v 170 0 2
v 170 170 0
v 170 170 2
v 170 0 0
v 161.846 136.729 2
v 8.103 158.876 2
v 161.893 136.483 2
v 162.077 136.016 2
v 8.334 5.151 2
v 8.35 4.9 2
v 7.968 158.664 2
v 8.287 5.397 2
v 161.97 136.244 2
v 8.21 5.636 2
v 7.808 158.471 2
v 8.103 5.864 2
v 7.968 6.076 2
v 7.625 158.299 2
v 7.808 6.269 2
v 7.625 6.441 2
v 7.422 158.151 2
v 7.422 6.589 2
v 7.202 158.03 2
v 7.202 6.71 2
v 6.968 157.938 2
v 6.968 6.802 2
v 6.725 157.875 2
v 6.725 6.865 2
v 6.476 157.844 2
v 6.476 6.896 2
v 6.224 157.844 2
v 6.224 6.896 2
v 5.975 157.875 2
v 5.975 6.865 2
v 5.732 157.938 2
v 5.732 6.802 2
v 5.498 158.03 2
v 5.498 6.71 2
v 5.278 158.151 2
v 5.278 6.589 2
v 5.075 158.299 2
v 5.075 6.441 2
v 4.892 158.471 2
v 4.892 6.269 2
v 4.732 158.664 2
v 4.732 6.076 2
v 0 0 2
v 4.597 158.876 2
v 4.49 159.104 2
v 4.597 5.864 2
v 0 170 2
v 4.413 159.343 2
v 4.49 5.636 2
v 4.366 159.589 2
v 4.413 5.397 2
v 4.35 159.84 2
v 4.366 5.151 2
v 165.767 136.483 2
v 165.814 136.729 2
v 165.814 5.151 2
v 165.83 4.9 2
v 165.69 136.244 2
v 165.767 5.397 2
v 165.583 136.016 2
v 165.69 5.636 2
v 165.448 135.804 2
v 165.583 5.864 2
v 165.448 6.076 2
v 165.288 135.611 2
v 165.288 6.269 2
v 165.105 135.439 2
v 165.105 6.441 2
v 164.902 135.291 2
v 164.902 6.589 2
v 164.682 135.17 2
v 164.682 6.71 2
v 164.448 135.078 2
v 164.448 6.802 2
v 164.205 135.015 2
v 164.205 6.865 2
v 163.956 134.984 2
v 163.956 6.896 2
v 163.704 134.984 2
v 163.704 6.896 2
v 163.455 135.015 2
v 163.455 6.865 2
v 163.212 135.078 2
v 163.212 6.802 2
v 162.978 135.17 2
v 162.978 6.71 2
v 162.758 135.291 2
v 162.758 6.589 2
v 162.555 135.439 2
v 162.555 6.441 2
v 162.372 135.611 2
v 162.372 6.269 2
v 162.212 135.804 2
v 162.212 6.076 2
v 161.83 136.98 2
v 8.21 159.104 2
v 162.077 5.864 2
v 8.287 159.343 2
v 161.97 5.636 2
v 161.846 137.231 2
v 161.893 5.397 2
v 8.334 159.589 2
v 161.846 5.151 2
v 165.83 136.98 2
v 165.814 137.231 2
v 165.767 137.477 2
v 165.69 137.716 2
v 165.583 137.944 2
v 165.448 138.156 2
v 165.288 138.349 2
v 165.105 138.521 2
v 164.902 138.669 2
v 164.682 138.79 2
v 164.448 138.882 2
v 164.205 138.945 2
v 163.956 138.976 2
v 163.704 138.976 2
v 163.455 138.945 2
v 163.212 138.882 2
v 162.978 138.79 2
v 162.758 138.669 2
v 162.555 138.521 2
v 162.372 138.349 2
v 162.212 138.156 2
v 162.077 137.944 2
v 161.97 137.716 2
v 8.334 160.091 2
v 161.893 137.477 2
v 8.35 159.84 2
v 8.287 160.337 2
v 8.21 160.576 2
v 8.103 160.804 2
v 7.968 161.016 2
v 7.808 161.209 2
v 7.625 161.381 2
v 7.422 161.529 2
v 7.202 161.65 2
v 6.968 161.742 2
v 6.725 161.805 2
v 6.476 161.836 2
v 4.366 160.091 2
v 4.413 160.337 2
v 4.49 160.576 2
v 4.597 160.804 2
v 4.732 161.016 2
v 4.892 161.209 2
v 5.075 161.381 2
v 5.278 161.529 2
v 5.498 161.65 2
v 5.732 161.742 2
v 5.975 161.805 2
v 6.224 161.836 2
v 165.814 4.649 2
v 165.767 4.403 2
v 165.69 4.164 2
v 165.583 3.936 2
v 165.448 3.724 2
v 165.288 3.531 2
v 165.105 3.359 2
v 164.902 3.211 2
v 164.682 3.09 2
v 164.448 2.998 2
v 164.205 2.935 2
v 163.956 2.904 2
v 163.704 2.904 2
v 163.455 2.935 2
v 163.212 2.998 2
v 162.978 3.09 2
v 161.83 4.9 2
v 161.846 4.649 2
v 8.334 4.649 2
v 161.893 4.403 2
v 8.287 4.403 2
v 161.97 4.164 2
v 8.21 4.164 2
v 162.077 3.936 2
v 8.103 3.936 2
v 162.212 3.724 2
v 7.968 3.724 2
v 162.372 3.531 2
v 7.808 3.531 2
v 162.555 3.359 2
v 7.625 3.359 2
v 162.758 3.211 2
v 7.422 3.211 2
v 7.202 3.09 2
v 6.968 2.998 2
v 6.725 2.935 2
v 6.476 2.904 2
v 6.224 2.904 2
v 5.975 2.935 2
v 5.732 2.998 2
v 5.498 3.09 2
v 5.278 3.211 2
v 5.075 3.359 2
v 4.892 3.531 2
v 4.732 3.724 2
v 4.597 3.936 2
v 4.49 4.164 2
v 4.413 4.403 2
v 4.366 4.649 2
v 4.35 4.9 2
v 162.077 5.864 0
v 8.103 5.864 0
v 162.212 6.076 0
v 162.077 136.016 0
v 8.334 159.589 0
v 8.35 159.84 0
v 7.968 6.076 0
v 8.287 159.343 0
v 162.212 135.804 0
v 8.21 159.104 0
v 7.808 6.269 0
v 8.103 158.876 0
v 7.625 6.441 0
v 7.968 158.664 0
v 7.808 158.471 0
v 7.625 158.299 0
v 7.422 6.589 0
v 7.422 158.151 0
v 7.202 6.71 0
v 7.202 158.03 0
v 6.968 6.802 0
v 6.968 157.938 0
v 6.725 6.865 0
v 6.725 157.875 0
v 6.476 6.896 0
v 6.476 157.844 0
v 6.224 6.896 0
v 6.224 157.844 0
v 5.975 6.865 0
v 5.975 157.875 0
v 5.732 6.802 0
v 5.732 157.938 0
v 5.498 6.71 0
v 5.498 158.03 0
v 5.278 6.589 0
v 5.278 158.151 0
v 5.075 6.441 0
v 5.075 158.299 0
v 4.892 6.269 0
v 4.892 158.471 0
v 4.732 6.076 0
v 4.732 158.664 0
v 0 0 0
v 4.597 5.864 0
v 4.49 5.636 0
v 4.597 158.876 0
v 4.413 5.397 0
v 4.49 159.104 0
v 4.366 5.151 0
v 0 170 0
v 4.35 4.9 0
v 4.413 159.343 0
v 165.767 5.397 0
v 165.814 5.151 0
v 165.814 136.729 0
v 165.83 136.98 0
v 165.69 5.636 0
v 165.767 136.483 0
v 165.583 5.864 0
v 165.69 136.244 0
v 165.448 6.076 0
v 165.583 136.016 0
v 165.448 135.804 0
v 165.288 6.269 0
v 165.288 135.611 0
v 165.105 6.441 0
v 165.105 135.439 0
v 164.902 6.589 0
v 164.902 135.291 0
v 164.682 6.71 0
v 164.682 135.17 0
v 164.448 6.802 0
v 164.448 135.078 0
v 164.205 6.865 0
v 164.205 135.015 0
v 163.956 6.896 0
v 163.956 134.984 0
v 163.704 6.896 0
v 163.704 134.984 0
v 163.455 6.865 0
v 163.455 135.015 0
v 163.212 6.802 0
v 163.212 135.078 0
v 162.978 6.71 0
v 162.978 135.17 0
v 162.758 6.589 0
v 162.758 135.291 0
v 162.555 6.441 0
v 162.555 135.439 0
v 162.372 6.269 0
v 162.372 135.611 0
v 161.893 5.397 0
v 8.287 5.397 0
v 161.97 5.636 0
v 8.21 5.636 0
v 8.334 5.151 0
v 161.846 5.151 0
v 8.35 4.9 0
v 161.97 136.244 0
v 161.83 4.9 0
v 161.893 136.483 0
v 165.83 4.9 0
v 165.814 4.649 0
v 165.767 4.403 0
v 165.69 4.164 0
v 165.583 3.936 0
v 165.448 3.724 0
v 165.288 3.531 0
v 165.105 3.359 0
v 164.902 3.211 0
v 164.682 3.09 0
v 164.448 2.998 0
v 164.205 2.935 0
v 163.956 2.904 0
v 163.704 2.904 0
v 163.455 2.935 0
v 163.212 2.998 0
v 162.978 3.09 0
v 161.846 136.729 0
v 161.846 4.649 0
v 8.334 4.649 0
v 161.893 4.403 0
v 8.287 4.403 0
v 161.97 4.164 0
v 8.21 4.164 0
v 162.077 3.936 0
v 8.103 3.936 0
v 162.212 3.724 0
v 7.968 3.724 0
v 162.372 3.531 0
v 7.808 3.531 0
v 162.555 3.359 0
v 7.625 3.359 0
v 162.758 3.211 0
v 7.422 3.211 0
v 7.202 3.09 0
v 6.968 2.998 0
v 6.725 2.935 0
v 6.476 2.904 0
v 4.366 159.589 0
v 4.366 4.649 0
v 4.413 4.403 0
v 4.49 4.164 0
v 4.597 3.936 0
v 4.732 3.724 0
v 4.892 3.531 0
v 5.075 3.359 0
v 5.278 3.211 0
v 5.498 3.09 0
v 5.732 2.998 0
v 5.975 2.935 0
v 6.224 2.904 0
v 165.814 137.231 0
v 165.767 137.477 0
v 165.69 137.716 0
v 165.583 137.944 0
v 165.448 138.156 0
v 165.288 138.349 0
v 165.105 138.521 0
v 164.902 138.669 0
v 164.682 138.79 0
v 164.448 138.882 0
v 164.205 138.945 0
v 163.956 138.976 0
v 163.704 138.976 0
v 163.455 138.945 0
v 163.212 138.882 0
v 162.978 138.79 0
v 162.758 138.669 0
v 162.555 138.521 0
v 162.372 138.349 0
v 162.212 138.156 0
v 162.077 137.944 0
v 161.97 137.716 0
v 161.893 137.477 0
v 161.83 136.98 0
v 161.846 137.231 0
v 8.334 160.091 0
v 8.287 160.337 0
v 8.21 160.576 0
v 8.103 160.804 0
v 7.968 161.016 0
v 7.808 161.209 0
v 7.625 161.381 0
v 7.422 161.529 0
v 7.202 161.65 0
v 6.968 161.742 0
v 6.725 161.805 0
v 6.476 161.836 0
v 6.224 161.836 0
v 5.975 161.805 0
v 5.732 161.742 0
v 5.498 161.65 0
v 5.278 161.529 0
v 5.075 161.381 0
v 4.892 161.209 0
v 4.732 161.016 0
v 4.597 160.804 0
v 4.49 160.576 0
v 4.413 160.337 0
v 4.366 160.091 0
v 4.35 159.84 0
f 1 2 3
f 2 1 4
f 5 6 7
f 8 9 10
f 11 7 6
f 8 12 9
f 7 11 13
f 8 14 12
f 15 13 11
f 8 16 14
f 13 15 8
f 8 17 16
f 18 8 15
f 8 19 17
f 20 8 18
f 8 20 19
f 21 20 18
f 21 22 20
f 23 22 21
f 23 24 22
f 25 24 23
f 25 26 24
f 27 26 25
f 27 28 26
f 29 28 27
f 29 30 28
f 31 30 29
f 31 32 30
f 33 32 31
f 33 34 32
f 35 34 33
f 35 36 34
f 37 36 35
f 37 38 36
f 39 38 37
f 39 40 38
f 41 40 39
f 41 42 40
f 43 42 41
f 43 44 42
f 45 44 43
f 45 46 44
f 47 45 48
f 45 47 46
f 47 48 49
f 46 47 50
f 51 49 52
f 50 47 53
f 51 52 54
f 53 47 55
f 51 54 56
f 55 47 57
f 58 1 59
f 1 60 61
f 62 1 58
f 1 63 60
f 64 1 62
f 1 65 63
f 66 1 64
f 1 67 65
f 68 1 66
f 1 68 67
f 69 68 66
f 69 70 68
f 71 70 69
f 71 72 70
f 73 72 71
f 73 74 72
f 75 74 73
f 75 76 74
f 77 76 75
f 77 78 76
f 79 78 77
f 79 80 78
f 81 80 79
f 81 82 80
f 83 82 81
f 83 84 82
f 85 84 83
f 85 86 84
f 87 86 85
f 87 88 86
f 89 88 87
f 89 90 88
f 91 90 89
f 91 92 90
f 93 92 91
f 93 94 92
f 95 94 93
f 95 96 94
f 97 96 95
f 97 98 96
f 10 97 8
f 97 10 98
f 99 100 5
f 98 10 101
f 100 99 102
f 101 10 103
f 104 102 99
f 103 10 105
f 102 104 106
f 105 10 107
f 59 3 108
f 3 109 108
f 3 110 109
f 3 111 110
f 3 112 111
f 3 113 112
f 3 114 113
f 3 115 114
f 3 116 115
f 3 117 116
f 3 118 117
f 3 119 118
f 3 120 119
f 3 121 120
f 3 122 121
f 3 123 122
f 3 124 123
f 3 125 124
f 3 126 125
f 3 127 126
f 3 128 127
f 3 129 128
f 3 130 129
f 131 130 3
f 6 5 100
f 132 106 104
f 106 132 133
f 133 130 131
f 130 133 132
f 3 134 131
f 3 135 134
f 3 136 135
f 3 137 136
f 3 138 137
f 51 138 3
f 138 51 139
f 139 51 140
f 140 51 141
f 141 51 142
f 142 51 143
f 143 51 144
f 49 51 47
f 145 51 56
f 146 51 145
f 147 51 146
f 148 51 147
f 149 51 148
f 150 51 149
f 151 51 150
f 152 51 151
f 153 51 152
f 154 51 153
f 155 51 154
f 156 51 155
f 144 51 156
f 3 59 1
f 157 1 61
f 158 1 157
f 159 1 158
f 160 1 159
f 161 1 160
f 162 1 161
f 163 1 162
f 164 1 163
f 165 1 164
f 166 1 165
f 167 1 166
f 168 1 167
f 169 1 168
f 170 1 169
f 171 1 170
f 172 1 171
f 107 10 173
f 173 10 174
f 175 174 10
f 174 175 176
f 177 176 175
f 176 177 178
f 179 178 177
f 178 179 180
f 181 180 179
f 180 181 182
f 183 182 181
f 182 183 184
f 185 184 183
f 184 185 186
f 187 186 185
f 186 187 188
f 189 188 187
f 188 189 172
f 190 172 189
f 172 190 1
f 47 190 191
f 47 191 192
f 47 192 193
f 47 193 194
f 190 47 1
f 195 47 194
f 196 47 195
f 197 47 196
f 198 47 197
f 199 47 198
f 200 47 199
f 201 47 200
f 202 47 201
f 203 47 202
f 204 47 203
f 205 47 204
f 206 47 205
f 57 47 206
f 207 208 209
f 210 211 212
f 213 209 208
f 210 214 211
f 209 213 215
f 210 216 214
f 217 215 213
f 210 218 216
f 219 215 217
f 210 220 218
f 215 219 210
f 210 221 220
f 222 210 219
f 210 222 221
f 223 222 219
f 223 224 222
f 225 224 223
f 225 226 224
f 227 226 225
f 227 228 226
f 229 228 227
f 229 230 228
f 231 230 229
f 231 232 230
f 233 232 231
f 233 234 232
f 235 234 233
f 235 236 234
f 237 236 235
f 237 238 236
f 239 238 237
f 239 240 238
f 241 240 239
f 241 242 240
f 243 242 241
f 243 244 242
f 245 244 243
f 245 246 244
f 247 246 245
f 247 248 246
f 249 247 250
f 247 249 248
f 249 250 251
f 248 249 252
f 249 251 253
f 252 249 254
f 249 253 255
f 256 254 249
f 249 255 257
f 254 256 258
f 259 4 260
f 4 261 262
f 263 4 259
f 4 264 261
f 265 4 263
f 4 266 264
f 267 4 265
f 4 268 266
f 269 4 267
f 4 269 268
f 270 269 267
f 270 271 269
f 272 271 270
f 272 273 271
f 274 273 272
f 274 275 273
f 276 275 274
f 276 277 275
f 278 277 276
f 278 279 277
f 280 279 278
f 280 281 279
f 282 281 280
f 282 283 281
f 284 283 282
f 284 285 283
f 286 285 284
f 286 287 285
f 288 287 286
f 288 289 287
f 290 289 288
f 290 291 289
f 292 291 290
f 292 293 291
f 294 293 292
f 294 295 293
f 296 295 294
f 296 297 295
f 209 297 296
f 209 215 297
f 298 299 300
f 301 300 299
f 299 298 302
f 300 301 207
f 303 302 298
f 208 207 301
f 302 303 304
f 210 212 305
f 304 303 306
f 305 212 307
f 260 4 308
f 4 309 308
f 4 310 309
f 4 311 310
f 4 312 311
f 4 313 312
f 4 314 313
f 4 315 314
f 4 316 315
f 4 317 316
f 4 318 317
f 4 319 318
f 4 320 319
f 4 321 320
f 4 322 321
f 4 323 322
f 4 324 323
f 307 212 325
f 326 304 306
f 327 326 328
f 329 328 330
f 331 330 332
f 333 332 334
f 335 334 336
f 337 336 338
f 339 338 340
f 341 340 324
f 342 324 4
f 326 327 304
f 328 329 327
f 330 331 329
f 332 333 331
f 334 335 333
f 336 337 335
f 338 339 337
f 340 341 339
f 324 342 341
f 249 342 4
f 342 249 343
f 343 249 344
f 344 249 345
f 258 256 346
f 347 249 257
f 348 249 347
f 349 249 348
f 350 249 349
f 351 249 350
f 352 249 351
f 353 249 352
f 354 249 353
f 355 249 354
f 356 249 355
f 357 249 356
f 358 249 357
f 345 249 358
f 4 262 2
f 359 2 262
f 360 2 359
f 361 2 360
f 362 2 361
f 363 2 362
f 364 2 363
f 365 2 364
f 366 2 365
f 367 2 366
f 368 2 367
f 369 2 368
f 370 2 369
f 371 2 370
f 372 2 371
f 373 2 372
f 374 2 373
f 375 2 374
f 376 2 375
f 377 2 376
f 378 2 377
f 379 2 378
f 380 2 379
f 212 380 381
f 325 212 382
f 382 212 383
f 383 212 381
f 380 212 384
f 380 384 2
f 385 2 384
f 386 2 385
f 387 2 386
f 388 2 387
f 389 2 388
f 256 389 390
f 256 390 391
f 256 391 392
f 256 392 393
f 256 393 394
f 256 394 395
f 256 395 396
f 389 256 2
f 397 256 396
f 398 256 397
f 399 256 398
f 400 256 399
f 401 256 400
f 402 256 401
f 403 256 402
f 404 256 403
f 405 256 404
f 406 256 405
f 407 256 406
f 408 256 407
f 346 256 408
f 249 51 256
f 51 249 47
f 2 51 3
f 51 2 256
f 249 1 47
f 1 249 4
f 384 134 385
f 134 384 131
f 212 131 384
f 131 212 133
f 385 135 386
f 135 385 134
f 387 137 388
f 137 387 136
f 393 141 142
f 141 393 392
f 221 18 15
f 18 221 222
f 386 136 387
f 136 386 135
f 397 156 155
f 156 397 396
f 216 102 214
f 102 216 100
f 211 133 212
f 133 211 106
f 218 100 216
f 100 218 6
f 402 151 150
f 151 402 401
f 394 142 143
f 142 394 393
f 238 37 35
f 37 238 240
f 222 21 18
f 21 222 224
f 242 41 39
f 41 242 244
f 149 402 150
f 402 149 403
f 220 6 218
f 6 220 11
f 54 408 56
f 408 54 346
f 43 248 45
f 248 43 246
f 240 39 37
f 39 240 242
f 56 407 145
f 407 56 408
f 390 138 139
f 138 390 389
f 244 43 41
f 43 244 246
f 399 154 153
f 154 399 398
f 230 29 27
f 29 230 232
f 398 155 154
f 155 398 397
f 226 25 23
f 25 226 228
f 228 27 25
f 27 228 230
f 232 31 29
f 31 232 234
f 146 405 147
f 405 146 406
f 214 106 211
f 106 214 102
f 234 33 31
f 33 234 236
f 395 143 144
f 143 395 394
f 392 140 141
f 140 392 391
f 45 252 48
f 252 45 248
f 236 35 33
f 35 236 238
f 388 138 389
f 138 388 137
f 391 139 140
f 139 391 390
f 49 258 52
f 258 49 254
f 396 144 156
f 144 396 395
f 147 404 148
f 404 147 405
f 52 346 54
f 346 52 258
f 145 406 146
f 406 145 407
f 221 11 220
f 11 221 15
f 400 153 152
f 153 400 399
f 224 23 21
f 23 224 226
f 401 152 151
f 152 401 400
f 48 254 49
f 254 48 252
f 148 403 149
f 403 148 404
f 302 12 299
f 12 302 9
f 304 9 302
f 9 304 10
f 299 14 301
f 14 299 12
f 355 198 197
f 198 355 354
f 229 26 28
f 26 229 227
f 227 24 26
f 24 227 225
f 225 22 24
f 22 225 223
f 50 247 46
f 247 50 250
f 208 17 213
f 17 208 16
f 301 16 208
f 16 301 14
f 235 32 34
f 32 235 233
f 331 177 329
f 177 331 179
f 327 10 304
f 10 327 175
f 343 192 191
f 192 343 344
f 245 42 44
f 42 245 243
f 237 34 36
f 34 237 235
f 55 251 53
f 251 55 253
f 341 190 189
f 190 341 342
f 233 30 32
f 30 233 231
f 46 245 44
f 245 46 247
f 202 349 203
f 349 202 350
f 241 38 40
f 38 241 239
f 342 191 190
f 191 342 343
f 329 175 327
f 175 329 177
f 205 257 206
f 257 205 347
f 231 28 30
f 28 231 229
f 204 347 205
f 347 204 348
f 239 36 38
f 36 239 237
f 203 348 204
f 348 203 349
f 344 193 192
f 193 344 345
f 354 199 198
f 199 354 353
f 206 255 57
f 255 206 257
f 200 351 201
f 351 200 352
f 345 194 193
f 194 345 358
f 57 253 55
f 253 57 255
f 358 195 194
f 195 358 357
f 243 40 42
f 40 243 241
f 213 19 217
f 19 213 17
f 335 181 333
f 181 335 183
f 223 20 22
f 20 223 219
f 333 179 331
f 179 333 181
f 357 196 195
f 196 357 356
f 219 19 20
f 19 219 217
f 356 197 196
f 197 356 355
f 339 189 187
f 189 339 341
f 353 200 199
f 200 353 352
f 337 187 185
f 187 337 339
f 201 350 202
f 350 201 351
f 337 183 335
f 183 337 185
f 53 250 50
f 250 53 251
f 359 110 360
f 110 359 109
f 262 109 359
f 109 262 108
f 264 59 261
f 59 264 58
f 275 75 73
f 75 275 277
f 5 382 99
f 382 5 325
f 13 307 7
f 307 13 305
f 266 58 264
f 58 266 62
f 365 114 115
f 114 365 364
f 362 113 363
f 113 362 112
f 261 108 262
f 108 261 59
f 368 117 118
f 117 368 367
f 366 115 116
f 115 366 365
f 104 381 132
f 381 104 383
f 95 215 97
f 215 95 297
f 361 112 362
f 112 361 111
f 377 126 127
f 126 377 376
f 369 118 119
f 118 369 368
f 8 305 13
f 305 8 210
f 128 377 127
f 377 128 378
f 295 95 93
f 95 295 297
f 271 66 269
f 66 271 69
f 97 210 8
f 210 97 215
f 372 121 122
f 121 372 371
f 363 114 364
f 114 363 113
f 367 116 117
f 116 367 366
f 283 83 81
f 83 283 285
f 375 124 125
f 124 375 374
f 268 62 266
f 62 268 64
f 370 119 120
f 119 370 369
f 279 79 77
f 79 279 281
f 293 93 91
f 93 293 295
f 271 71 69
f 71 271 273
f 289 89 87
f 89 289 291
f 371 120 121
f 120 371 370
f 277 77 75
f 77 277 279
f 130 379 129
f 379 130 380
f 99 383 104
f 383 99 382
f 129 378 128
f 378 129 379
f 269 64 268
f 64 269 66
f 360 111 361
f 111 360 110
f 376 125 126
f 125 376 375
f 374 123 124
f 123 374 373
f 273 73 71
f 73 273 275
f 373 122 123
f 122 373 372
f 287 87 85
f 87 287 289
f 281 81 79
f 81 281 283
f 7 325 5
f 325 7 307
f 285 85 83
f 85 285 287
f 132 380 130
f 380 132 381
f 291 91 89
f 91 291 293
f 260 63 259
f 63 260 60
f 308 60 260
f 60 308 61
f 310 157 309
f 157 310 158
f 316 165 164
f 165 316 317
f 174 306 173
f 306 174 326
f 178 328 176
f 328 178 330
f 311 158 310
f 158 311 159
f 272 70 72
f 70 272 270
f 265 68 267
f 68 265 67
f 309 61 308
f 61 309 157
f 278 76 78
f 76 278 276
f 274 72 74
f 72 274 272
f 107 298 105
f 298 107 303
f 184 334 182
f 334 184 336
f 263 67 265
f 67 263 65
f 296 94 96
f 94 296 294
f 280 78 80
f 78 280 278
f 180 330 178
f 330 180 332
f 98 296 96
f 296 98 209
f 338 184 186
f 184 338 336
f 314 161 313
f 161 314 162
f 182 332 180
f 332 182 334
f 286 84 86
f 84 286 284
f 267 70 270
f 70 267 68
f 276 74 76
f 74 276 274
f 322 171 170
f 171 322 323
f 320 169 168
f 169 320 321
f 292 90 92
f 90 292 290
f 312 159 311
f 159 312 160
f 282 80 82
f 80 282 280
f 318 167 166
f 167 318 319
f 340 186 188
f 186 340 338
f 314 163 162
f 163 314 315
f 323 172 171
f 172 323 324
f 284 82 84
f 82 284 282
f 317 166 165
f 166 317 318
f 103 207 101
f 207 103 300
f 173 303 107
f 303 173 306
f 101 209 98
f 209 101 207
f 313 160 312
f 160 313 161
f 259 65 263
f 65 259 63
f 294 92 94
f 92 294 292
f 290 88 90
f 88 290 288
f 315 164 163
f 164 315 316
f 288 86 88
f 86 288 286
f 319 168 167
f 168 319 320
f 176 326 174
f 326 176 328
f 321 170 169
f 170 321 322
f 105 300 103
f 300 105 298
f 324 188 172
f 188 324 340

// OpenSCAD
module itx(){
difference(){
    cube([170, 170, 2]);
    //0.25, h-0.4
    translate([6.35, 170-10.16,0])cylinder(10, r=2,center=true,$fn=50);
    //0.25, h-0.4-6.1
    translate([6.35, 170-10.16-154.94,0])cylinder(10, r=2,center=true,$fn=50);
    //0.25+6.2, h-0.4-0.9
    translate([6.35+157.48, 170-10.16-22.86,0])cylinder(10, r=2,center=true,$fn=50);
    //0.25, h-0.4-6.1
    translate([6.35+157.48, 170-10.16-154.94,0])cylinder(10, r=2,center=true,$fn=50);
}
}

itx();
